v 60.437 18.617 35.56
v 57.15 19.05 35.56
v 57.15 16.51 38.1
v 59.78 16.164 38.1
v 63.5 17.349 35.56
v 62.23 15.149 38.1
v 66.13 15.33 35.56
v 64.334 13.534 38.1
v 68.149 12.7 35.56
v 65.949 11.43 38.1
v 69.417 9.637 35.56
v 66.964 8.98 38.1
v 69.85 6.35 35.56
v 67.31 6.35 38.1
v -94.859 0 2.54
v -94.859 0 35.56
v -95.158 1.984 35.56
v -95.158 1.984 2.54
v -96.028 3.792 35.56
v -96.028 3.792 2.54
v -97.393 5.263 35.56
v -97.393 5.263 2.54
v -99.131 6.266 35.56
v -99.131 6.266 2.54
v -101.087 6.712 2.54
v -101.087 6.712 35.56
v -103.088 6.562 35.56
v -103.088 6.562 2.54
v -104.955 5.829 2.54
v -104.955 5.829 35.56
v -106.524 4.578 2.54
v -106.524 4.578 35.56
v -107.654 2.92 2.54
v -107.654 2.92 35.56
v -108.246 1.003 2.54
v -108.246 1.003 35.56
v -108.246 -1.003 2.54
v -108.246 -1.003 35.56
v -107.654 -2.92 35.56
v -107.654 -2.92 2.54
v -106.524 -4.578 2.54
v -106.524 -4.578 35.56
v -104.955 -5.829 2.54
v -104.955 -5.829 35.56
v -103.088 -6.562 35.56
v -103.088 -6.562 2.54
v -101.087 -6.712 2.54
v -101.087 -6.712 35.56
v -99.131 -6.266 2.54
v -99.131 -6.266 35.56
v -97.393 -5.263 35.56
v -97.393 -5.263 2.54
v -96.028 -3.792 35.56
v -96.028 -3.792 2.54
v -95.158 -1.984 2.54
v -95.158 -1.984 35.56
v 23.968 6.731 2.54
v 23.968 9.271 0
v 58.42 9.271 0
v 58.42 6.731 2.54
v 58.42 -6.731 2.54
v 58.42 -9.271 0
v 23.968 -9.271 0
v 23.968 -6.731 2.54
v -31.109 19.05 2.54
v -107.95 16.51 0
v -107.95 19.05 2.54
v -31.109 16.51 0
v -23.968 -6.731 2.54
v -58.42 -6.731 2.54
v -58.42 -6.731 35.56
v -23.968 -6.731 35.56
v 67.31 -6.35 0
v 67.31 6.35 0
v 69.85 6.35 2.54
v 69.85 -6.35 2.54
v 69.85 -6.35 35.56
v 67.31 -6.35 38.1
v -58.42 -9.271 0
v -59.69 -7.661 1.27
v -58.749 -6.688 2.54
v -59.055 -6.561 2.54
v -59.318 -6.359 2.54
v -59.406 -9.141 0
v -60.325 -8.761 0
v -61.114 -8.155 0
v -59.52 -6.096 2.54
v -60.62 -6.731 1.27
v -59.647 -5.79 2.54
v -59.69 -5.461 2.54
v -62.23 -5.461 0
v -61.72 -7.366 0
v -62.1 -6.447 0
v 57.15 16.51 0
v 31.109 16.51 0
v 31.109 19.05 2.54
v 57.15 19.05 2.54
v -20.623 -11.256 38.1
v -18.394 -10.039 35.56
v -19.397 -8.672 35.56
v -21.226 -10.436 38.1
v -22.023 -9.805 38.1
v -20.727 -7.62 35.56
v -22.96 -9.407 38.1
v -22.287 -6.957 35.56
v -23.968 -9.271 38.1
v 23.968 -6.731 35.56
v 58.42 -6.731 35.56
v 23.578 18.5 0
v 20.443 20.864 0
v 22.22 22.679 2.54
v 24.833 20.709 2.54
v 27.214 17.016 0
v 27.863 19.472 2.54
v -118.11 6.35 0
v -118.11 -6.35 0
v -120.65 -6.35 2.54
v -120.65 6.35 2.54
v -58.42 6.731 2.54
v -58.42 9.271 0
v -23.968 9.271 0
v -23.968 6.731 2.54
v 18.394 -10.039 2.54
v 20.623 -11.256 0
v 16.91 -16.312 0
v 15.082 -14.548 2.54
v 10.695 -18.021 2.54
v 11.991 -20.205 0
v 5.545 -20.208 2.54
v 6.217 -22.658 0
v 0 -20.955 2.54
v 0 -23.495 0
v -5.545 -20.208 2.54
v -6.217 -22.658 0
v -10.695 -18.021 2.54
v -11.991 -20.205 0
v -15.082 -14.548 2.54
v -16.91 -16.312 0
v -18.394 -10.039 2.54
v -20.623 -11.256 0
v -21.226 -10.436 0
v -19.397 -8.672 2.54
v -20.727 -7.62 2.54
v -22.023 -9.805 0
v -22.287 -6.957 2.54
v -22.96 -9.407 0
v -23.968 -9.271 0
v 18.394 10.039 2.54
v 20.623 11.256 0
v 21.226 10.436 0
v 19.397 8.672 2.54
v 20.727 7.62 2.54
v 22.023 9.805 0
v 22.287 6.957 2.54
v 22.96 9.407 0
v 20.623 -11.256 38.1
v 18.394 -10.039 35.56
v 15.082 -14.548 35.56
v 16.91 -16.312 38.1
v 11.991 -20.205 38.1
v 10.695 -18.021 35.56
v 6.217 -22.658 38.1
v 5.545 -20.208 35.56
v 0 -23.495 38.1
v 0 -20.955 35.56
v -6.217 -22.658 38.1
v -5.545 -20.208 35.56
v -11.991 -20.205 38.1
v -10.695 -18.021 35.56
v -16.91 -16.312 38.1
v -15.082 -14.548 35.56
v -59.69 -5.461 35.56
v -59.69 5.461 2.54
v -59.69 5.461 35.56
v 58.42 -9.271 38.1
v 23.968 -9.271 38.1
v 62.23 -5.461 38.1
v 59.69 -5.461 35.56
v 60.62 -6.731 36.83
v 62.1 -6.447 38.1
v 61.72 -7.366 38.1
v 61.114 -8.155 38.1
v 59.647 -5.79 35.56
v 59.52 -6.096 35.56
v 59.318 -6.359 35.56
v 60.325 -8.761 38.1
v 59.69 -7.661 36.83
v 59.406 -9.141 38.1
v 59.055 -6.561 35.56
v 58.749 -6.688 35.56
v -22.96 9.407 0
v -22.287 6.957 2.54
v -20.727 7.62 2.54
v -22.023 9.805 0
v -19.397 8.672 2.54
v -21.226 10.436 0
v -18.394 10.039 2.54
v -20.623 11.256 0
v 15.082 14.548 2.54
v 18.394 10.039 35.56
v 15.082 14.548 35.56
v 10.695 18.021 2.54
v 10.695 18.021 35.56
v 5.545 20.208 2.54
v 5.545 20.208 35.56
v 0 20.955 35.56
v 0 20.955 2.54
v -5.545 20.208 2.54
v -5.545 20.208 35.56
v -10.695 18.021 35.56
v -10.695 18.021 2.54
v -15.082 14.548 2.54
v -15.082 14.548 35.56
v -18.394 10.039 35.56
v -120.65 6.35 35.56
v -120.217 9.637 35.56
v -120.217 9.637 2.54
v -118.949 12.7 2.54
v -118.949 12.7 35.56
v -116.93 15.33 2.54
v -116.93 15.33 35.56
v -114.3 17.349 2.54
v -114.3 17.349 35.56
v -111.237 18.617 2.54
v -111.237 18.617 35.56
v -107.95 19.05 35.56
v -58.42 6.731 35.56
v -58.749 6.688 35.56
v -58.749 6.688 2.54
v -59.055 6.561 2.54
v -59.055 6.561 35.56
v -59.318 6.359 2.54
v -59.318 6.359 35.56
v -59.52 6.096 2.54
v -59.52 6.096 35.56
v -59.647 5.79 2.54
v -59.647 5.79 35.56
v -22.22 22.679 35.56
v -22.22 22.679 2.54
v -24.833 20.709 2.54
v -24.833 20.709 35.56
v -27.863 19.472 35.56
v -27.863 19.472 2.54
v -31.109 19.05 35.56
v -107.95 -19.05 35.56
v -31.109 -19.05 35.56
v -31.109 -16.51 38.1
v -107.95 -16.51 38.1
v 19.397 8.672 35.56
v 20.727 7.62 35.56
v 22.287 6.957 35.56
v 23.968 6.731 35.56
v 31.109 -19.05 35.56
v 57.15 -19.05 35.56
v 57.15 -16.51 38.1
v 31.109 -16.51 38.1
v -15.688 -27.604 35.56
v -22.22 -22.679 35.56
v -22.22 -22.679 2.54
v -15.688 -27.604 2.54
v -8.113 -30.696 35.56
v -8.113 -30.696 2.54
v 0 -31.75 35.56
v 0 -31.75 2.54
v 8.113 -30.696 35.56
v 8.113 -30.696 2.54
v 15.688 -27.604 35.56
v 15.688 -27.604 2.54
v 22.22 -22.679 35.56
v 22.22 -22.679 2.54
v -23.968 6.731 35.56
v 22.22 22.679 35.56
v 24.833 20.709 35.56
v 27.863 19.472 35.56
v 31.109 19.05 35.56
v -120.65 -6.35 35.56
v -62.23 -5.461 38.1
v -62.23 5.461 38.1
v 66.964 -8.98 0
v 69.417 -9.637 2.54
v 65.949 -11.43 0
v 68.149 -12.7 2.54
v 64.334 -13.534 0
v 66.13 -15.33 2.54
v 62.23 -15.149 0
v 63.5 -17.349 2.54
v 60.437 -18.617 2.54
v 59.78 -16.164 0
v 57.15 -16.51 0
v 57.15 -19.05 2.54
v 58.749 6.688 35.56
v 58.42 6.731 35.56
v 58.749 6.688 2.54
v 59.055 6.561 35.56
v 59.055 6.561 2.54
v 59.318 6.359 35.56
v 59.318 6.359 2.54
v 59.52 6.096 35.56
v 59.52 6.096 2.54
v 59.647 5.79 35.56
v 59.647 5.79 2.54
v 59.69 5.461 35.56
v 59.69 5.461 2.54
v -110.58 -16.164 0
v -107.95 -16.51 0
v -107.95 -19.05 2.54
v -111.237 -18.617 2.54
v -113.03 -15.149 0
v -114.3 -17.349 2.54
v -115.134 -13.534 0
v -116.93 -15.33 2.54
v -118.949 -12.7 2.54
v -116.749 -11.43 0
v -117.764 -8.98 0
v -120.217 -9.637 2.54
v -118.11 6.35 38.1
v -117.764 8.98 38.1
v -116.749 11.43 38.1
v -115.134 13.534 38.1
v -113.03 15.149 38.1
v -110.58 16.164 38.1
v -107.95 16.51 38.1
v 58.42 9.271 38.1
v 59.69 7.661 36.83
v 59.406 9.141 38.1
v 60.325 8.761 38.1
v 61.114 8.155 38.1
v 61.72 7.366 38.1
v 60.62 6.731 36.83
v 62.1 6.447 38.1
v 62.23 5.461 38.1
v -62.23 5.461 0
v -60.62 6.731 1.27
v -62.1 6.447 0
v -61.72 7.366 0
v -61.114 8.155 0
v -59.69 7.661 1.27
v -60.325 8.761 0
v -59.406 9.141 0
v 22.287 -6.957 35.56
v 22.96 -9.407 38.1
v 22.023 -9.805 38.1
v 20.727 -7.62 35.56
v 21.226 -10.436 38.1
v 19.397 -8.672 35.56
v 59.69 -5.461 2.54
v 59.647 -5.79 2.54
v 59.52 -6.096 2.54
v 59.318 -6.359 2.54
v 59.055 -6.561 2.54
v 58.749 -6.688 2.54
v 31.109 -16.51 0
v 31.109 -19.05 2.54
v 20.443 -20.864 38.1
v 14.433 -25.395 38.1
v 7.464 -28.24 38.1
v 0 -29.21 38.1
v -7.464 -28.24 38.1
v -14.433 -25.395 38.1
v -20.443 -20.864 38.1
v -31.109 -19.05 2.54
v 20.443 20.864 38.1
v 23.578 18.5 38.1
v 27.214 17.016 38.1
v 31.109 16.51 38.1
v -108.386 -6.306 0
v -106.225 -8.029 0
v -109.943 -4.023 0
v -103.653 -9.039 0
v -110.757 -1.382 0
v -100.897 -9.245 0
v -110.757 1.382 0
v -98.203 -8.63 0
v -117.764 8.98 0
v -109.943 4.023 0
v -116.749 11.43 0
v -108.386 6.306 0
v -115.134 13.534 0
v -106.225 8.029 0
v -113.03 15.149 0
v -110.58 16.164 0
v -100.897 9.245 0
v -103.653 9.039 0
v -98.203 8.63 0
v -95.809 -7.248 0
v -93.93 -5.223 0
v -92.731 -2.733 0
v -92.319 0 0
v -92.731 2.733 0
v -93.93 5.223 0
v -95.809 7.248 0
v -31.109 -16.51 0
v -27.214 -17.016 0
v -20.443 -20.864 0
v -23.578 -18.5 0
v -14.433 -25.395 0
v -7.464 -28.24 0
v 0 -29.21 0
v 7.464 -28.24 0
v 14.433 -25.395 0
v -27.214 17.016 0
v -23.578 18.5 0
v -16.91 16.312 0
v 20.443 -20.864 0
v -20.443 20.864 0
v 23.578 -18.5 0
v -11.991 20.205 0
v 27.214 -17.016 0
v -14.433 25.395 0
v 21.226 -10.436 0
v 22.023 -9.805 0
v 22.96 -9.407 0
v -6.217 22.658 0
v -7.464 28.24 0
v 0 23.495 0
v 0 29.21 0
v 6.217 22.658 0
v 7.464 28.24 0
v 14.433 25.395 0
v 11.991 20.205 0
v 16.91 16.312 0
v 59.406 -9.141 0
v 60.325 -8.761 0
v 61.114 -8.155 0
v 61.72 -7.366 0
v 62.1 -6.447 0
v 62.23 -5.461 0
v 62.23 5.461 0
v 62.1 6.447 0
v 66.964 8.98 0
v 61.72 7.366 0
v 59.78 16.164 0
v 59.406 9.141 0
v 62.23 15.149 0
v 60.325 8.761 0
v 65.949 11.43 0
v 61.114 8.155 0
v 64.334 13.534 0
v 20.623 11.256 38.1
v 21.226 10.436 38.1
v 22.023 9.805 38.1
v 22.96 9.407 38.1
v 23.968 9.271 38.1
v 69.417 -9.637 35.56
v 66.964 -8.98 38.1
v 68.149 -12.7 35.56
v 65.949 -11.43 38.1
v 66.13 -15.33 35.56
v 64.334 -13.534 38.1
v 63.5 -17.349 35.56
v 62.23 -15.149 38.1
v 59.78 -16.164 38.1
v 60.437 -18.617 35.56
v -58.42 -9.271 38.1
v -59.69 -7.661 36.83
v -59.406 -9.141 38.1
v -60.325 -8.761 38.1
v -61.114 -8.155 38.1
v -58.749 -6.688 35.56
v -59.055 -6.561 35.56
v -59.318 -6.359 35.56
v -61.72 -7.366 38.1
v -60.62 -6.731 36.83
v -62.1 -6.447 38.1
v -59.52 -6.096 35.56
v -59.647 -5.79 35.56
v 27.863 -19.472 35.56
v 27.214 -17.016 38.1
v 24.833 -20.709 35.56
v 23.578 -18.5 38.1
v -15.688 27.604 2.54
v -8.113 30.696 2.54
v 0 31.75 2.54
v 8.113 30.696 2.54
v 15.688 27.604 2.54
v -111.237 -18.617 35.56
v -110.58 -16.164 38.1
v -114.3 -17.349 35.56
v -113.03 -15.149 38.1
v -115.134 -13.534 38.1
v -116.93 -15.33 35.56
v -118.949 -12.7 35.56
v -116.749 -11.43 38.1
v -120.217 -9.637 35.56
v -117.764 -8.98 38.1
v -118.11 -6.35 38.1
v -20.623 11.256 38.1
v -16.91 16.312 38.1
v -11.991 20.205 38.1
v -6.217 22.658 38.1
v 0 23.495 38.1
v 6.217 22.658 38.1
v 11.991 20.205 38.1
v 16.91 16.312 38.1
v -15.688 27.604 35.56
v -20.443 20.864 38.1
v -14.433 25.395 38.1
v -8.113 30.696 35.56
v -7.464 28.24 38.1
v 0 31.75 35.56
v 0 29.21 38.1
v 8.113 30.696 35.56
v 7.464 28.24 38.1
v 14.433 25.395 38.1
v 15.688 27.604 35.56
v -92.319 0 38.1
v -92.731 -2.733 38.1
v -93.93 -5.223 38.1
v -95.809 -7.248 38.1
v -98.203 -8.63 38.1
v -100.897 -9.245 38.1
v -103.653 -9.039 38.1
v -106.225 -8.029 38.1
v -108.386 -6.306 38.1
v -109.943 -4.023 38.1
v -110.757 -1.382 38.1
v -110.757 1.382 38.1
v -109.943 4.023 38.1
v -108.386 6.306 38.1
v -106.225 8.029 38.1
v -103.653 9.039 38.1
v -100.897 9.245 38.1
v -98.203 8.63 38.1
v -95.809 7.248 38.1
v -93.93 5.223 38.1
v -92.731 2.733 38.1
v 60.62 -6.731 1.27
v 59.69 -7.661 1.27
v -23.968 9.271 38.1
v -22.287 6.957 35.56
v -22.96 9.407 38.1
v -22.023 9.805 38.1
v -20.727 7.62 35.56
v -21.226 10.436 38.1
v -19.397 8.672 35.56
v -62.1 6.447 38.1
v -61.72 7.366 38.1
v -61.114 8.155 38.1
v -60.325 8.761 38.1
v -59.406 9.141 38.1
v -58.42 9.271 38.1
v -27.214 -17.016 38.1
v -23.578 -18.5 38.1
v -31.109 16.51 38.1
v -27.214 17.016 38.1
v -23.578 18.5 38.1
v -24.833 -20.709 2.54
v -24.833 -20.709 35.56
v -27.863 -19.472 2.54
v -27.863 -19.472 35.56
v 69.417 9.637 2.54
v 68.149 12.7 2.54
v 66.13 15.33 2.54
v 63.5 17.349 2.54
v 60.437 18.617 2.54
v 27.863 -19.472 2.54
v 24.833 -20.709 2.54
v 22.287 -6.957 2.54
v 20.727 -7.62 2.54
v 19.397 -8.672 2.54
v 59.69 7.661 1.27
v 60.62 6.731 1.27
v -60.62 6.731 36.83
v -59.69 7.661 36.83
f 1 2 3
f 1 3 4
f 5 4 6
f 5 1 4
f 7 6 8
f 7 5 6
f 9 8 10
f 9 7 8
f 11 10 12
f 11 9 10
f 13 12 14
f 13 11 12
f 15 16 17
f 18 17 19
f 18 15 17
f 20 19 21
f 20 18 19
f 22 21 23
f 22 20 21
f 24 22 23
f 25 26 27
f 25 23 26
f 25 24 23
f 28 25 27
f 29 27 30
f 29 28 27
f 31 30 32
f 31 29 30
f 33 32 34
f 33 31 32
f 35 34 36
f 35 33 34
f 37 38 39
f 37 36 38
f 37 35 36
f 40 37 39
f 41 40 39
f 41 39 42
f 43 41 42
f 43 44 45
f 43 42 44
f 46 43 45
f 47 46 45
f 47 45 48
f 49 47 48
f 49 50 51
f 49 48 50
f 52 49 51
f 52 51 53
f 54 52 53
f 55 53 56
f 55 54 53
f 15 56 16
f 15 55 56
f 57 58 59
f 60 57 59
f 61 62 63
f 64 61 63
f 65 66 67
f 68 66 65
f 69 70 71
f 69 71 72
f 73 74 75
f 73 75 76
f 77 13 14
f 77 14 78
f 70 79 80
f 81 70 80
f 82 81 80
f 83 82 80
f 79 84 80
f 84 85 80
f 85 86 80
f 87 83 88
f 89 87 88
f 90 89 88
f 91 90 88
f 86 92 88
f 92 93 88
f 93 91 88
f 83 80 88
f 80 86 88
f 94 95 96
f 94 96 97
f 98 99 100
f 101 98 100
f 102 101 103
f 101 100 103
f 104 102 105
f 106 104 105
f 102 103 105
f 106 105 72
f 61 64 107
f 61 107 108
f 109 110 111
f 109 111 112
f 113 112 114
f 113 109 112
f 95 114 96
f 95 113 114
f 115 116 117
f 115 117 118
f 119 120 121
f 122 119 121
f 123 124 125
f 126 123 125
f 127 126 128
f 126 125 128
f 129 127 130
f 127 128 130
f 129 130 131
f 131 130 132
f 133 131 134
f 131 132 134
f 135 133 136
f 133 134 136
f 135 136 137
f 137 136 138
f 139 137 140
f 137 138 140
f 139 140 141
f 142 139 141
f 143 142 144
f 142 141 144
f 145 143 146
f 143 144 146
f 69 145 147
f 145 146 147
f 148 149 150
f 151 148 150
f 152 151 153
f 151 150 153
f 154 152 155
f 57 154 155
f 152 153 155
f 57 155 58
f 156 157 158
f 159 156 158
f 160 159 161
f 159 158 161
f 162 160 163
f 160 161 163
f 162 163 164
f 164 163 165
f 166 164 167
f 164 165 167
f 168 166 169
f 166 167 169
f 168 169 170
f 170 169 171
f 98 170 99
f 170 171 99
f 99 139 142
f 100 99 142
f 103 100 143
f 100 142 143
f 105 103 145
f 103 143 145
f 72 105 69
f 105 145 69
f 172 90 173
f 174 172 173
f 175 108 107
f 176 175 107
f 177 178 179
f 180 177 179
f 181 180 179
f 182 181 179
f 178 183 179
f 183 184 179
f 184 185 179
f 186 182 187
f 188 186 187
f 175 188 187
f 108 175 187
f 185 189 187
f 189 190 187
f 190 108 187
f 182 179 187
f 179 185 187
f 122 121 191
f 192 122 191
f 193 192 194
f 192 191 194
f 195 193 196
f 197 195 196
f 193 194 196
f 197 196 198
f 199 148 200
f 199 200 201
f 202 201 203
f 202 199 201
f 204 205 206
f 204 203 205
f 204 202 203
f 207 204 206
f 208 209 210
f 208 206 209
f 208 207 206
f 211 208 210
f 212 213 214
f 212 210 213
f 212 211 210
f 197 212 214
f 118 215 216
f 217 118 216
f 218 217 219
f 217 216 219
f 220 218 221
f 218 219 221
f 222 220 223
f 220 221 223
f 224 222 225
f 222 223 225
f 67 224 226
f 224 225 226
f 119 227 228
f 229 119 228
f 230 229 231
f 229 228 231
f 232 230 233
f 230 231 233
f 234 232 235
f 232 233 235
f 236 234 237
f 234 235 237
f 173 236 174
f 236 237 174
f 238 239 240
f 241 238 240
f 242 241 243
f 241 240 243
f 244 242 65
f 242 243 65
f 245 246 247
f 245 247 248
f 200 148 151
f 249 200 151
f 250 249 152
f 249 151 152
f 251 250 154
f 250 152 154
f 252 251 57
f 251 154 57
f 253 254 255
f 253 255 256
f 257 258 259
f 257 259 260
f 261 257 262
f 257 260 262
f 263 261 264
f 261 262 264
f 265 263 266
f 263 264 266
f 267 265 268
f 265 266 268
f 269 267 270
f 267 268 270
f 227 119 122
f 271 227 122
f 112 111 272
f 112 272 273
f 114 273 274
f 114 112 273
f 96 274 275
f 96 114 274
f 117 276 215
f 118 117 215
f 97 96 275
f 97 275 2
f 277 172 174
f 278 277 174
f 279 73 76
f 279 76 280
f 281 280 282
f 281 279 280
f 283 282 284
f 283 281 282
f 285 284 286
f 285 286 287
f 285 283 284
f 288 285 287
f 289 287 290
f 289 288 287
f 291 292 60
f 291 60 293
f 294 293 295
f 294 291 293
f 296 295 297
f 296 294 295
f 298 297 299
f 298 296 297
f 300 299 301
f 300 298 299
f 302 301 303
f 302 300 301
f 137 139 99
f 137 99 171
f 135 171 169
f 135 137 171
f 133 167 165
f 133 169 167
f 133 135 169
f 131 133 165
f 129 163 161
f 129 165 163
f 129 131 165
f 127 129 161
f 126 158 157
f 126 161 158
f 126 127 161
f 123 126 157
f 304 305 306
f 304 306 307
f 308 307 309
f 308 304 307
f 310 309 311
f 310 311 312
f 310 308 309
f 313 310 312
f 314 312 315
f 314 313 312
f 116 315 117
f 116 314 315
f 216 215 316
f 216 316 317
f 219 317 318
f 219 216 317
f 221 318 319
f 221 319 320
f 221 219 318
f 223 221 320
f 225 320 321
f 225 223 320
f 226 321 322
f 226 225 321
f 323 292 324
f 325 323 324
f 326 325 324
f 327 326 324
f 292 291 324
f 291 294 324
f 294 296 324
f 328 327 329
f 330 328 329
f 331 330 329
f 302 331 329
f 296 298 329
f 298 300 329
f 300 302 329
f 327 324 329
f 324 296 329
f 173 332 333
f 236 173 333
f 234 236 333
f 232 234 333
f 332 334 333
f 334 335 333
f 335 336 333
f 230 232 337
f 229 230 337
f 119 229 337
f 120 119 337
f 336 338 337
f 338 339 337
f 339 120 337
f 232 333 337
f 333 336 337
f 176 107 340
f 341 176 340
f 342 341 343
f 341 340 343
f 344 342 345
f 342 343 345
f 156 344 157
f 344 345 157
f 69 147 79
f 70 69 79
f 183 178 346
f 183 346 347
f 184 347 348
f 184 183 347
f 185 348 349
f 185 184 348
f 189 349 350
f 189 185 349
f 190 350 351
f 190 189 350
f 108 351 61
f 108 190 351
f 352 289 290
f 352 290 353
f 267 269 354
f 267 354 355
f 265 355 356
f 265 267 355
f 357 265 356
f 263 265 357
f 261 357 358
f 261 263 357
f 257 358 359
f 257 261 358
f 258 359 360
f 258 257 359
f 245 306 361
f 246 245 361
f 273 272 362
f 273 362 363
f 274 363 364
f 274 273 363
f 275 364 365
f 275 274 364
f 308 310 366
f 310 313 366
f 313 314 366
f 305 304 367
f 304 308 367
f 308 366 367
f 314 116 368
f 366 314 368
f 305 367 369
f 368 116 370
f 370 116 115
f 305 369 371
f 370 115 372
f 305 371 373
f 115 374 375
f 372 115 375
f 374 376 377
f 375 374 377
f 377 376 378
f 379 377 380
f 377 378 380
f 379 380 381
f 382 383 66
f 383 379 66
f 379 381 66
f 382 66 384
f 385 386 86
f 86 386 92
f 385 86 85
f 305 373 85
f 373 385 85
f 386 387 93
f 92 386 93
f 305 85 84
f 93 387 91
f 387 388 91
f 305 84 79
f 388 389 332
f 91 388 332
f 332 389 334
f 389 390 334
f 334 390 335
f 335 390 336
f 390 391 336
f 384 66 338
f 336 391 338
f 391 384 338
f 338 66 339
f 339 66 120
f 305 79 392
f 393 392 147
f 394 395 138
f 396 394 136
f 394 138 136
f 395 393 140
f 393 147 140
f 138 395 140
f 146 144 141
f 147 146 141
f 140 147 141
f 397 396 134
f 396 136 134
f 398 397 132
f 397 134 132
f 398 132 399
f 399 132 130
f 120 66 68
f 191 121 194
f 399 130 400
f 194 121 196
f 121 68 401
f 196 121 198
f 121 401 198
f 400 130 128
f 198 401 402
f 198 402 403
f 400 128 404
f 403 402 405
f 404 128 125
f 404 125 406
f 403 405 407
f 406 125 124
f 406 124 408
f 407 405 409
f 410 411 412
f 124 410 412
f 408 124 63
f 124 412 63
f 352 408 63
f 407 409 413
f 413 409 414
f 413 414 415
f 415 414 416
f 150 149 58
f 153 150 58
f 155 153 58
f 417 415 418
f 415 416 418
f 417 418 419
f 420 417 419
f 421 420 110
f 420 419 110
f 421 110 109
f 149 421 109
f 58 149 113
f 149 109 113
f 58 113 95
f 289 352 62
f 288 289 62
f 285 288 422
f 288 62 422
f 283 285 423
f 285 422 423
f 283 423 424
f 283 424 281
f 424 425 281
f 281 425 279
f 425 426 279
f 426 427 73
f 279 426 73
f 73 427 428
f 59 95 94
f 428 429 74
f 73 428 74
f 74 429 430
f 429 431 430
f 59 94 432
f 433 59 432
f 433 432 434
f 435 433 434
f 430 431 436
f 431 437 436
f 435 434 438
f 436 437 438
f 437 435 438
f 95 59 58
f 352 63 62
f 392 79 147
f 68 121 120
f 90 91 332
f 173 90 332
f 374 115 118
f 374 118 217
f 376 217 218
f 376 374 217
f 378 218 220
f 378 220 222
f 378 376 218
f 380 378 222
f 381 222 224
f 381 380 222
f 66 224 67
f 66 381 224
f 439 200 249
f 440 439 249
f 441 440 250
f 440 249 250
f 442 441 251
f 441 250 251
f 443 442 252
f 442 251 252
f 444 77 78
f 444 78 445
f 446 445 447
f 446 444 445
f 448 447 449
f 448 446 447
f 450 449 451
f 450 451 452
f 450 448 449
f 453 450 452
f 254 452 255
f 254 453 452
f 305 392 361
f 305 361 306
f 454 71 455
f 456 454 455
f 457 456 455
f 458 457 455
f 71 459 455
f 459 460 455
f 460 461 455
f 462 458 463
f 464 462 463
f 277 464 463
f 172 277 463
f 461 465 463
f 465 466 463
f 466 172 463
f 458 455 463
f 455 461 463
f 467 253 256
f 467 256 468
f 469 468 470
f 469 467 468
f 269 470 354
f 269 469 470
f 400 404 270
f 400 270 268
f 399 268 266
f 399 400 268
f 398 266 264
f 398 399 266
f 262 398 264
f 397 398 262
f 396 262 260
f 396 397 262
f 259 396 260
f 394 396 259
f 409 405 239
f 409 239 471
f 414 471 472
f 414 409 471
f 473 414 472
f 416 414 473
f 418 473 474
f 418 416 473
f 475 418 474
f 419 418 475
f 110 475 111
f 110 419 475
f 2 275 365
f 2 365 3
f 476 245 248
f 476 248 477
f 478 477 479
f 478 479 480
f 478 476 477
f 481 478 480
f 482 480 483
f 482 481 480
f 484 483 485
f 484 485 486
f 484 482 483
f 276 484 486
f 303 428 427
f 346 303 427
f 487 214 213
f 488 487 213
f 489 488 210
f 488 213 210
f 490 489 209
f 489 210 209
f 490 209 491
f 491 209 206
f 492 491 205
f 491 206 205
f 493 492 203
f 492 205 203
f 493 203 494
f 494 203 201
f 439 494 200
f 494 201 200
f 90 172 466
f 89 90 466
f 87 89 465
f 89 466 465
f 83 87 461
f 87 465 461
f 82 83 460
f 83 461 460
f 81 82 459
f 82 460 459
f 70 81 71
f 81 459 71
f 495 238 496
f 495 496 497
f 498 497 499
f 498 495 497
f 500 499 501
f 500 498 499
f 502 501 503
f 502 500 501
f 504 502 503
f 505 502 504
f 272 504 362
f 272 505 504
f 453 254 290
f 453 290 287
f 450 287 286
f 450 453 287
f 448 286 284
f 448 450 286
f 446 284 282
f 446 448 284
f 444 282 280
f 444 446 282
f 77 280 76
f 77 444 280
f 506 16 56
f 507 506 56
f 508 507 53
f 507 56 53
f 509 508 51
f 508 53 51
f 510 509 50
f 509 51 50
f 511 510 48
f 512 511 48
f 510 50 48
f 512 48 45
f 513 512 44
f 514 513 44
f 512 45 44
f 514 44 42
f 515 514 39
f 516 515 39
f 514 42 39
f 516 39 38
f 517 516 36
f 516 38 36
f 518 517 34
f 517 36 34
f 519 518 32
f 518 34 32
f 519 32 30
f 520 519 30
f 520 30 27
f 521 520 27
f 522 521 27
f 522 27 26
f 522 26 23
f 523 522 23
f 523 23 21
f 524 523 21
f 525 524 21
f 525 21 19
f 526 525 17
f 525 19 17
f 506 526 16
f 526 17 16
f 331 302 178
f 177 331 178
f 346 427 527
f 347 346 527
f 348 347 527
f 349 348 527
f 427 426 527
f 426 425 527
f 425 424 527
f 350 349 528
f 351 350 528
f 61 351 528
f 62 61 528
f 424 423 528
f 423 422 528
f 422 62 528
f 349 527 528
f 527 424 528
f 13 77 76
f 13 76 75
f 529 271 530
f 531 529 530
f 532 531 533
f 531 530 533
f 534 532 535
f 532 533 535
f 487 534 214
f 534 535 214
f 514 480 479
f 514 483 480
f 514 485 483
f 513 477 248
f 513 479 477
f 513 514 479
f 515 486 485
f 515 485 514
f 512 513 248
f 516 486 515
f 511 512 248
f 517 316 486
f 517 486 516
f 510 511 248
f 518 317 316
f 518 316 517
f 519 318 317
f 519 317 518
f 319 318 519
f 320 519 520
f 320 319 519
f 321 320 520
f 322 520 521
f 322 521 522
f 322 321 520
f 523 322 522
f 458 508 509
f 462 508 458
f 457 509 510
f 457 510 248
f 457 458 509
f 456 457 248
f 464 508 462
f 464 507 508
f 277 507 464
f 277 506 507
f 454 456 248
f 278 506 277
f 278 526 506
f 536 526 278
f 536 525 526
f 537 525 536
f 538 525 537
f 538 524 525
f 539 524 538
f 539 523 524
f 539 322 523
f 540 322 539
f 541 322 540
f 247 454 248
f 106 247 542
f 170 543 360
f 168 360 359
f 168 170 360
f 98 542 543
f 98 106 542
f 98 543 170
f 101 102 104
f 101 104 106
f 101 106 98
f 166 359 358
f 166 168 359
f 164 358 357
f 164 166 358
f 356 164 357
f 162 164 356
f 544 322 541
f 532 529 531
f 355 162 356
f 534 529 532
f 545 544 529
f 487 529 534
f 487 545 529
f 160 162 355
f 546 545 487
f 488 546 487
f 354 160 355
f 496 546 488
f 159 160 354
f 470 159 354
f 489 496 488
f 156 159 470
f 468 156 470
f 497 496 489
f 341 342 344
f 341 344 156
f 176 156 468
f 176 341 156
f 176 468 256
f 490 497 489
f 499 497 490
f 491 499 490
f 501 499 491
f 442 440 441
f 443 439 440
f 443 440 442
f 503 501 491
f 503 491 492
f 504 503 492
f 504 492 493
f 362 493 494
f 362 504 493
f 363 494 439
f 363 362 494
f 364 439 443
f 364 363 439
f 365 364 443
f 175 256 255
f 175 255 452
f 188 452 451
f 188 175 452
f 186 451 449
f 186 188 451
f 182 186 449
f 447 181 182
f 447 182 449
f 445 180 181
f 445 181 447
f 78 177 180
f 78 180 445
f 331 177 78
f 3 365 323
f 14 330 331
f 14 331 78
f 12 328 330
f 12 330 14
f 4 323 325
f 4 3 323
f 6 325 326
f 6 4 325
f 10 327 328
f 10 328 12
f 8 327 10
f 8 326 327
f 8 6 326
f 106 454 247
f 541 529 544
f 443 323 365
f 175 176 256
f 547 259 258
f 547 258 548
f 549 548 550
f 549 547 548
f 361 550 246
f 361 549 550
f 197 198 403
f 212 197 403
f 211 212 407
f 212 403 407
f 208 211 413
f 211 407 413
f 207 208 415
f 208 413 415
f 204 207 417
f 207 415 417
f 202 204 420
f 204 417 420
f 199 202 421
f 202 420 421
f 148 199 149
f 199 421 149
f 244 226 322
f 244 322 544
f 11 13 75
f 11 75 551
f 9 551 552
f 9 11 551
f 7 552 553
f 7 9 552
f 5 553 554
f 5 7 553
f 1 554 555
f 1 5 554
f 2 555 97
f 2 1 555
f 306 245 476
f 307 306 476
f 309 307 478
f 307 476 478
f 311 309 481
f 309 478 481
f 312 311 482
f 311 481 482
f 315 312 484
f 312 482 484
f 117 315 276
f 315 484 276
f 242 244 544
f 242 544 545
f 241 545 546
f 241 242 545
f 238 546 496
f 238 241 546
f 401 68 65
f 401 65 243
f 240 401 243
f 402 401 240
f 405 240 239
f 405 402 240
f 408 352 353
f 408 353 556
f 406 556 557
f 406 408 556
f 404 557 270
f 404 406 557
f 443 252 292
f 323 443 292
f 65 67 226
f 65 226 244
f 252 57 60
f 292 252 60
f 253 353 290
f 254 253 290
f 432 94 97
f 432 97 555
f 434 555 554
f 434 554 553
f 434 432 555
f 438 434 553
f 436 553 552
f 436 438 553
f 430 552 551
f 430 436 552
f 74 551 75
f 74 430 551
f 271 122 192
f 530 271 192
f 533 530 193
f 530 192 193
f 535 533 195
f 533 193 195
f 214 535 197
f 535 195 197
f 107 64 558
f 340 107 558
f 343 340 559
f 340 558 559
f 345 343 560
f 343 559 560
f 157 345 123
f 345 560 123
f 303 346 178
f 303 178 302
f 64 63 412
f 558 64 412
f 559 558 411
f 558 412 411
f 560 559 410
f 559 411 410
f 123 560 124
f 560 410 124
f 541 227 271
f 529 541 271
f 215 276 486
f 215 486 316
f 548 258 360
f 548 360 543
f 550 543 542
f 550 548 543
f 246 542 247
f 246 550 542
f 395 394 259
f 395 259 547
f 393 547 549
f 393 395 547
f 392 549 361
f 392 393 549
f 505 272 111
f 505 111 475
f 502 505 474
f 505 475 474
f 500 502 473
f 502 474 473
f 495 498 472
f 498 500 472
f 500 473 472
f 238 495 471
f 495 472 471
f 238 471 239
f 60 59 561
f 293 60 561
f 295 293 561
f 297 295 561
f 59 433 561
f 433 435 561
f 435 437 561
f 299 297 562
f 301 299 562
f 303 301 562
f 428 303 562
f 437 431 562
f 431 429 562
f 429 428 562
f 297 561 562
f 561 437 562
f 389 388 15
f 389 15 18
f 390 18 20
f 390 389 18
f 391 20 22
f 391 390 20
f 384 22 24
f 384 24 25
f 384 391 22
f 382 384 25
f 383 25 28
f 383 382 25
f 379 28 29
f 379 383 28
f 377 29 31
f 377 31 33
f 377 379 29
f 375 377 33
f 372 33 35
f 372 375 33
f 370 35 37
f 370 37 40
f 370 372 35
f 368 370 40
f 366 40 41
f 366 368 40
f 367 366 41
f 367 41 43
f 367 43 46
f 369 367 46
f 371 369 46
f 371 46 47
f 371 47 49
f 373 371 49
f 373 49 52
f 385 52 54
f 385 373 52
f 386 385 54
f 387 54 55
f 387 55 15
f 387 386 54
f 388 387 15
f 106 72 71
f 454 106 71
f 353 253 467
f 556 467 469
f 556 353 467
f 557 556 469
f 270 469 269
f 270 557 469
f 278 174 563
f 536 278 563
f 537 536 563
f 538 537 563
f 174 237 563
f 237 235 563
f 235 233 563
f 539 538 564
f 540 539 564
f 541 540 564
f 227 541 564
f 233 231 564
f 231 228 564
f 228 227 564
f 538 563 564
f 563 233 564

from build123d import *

# Parameters (mm, degrees)
F0_W      = 139.7
F0_H      = 38.1
F1_DEPTH  = 38.1
F2_R      = 31.75
F3_DEPTH  = 38.1
F4_W      = 119.38
F4_H      = 13.462
F5_DEPTH  = 38.101
F6_R      = 20.955
F7_DEPTH  = 38.101
F8_W      = 50.8
F8_H      = 38.1
F9_DEPTH  = 38.1
F10_R     = 12.7
F11_R     = 6.35
F12_R     = 1.27
F13_R     = 12.7
F14_R     = 6.731
F15_DEPTH = 38.101
F16_SIZE  = 2.54


with BuildPart() as f1:
    # F0 (on Top) → F1 (new body)
    with BuildSketch(Plane.XY):
        Rectangle(F0_W, F0_H)
    extrude(amount=F1_DEPTH)

    # F2 (on Top) → F3 (join, through all)
    with BuildSketch(Plane.XY):
        Circle(F2_R)
    extrude(amount=F3_DEPTH)

    # F4 (on Top) → F5 (cut, through all)
    with BuildSketch(Plane.XY):
        Rectangle(F4_W, F4_H)
    extrude(amount=F5_DEPTH, mode=Mode.SUBTRACT)

    # F6 (on Top) → F7 (cut, through all)
    with BuildSketch(Plane.XY):
        Circle(F6_R)
    extrude(amount=F7_DEPTH, mode=Mode.SUBTRACT)

    # F8 (on Top) → F9 (join, through all)
    with BuildSketch(Plane.XY):
        with Locations((-95.25, 0)):
            Rectangle(F8_W, F8_H)
    extrude(amount=F9_DEPTH)

    # F10
    f10_edges = [f1.edges().sort_by_distance(p)[0] for p in [
        (25.4, -19.05, 19.05),
        (-25.4, -19.05, 19.05),
        (25.4, 19.05, 19.05),
        (-25.4, 19.05, 19.05),
    ]]
    fillet(f10_edges, radius=F10_R)

    # F11
    f11_edges = [f1.edges().sort_by_distance(p)[0] for p in [
        (-19.844537, -6.731, 19.05),
        (19.844537, -6.731, 19.05),
        (19.844537, 6.731, 19.05),
        (-19.844537, 6.731, 19.05),
    ]]
    fillet(f11_edges, radius=F11_R)

    # F12
    f12_edges = [f1.edges().sort_by_distance(p)[0] for p in [
        (59.69, 6.731, 19.05),
        (-59.69, 6.731, 19.05),
        (-59.69, -6.731, 19.05),
        (59.69, -6.731, 19.05),
    ]]
    fillet(f12_edges, radius=F12_R)

    # F13
    f13_edges = [f1.edges().sort_by_distance(p)[0] for p in [
        (-58.42, 6.731, 19.05),
        (-58.42, -6.731, 19.05),
        (69.85, 19.05, 19.05),
        (69.85, -19.05, 19.05),
        (-120.65, -19.05, 19.05),
        (-120.65, 19.05, 19.05),
    ]]
    fillet(f13_edges, radius=F13_R)

    # F14 (on Top) → F15 (cut, through all)
    with BuildSketch(Plane.XY):
        with Locations((-101.5897616744, 0)):
            Circle(F14_R)
    extrude(amount=F15_DEPTH, mode=Mode.SUBTRACT)

    # F16
    f16_edges = [f1.edges().sort_by_distance(p)[0] for p in [
        (44.12926, 19.05, 38.1),
        (66.130256, 15.330256, 38.1),
        (26.308371, 19.992085, 38.1),
        (69.85, 0, 38.1),
        (0, 31.75, 38.1),
        (66.130256, -15.330256, 38.1),
        (-26.308371, 19.992085, 38.1),
        (44.12926, -19.05, 38.1),
        (-69.52926, 19.05, 38.1),
        (26.308371, -19.992085, 38.1),
        (-116.930256, 15.330256, 38.1),
        (0, -31.75, 38.1),
        (-120.65, 0, 38.1),
        (-26.308371, -19.992085, 38.1),
        (-116.930256, -15.330256, 38.1),
        (-69.52926, -19.05, 38.1),
        (-108.320762, 0, 38.1),
        (-41.193848, -6.731, 38.1),
        (-59.318026, -6.359026, 38.1),
        (-20.726924, -7.62024, 38.1),
        (-59.69, 0, 38.1),
        (0, -20.955, 38.1),
        (-59.318026, 6.359026, 38.1),
        (20.726924, -7.62024, 38.1),
        (-41.193848, 6.731, 38.1),
        (41.193848, -6.731, 38.1),
        (-20.726924, 7.62024, 38.1),
        (59.318026, -6.359026, 38.1),
        (0, 20.955, 38.1),
        (59.69, 0, 38.1),
        (20.726924, 7.62024, 38.1),
        (59.318026, 6.359026, 38.1),
        (41.193848, 6.731, 38.1),
        (44.12926, 19.05, 0),
        (66.130256, 15.330256, 0),
        (26.308371, 19.992085, 0),
        (69.85, 0, 0),
        (0, 31.75, 0),
        (66.130256, -15.330256, 0),
        (-26.308371, 19.992085, 0),
        (44.12926, -19.05, 0),
        (-69.52926, 19.05, 0),
        (26.308371, -19.992085, 0),
        (-116.930256, 15.330256, 0),
        (0, -31.75, 0),
        (-120.65, 0, 0),
        (-26.308371, -19.992085, 0),
        (-116.930256, -15.330256, 0),
        (-69.52926, -19.05, 0),
        (-108.320762, 0, 0),
        (41.193848, 6.731, 0),
        (59.318026, 6.359026, 0),
        (20.726924, 7.62024, 0),
        (59.69, 0, 0),
        (0, 20.955, 0),
        (59.318026, -6.359026, 0),
        (-20.726924, 7.62024, 0),
        (41.193848, -6.731, 0),
        (-41.193848, 6.731, 0),
        (20.726924, -7.62024, 0),
        (-59.318026, 6.359026, 0),
        (0, -20.955, 0),
        (-59.69, 0, 0),
        (-20.726924, -7.62024, 0),
        (-59.318026, -6.359026, 0),
        (-41.193848, -6.731, 0),
    ]]
    chamfer(f16_edges, length=F16_SIZE)


solid = f1.part
